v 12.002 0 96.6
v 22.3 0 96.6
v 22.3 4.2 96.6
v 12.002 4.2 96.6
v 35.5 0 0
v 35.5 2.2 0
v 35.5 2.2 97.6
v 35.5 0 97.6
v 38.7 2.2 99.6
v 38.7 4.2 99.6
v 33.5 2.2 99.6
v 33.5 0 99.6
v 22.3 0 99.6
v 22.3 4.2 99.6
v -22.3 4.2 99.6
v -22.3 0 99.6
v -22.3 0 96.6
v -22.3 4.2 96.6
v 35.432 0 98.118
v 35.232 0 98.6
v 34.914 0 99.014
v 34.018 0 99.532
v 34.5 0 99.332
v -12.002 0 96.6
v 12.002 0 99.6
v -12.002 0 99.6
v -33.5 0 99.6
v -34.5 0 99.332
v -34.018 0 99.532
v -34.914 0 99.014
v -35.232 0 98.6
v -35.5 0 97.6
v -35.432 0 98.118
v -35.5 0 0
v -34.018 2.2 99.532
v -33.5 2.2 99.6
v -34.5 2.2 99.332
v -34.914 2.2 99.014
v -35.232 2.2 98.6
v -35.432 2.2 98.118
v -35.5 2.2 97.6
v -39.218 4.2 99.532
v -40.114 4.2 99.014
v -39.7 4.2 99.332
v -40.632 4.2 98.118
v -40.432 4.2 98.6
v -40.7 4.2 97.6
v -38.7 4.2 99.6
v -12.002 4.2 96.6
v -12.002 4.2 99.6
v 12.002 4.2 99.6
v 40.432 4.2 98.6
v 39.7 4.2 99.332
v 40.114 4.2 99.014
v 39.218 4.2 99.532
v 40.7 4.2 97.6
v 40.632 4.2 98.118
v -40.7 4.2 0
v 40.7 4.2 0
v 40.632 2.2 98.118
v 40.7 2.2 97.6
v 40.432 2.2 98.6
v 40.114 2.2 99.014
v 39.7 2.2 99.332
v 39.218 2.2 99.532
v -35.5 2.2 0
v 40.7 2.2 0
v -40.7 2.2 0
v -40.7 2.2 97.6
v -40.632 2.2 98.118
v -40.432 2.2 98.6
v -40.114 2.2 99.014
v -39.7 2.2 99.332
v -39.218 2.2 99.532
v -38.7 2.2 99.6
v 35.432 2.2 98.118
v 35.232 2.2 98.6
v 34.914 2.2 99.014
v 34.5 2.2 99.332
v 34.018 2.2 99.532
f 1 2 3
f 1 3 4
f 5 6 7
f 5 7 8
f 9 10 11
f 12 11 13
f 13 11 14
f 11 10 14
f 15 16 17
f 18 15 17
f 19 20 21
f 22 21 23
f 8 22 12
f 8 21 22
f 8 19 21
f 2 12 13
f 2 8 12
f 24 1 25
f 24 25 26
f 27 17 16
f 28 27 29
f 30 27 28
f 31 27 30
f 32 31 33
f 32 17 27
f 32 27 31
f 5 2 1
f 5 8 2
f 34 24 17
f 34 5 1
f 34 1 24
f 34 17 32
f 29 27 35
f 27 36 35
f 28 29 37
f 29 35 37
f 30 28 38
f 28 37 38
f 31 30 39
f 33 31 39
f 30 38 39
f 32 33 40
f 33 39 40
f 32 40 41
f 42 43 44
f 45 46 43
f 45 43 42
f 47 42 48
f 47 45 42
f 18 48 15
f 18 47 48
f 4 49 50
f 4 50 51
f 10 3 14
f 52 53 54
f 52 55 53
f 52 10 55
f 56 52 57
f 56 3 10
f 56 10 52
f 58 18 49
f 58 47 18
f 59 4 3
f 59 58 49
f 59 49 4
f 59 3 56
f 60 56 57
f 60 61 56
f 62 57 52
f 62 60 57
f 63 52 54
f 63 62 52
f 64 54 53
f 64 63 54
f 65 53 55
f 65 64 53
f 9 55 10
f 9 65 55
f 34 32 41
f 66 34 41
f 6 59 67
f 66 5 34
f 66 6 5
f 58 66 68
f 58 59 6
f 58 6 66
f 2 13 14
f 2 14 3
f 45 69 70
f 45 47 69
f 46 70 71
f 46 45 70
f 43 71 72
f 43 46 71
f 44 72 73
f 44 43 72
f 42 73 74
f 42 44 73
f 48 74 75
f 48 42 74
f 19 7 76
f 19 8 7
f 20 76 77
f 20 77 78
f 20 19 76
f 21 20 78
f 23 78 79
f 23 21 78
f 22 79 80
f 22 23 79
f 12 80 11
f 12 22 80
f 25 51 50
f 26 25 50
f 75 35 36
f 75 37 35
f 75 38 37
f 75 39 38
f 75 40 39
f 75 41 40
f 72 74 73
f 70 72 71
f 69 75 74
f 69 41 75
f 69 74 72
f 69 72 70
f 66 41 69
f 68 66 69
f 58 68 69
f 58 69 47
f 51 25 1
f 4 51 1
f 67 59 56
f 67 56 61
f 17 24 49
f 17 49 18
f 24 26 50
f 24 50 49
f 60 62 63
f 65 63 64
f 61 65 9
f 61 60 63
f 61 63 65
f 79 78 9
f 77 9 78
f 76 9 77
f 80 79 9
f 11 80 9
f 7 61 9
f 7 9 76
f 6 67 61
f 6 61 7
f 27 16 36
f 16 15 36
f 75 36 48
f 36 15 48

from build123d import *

# Parameters (mm, degrees)
BOSS_EXTRUDE1_DEPTH = 99.6
FILLET1_R           = 2
SKETCH3_W           = 10.297809691
SKETCH3_H           = 3
CUT_EXTRUDE1_DEPTH  = 5
FILLET2_R           = 2


with BuildPart() as part:
    # Sketch2 → Boss-Extrude1 (new body)
    with BuildSketch(Plane.XY):
        Polygon((35.5, 0), (-35.5, 0), (-35.5, 2.2), (-40.7, 2.2), (-40.7, 4.2), (40.7, 4.2), (40.7, 2.2), (35.5, 2.2), align=None)
    extrude(amount=BOSS_EXTRUDE1_DEPTH)

    # Fillet1
    fillet1_edges = [part.edges().sort_by_distance(p)[0] for p in [
        (40.7, 3.2, 99.6),
        (-40.7, 3.2, 99.6),
    ]]
    fillet(fillet1_edges, radius=FILLET1_R)

    # Sketch3 → Cut-Extrude1 (cut)
    with BuildSketch(Plane(origin=(0, 0, 0), x_dir=(-1, 0, 0), z_dir=(0, -1, 0))):
        with Locations((17.151095155, -98.1)):
            Rectangle(SKETCH3_W, SKETCH3_H)
        with Locations((-17.151095155, -98.1)):
            Rectangle(SKETCH3_W, SKETCH3_H)
    extrude(amount=-CUT_EXTRUDE1_DEPTH, mode=Mode.SUBTRACT)

    # Fillet2
    fillet2_edges = [part.edges().sort_by_distance(p)[0] for p in [
        (35.5, 1.1, 99.6),
        (-35.5, 1.1, 99.6),
    ]]
    fillet(fillet2_edges, radius=FILLET2_R)


solid = part.part
